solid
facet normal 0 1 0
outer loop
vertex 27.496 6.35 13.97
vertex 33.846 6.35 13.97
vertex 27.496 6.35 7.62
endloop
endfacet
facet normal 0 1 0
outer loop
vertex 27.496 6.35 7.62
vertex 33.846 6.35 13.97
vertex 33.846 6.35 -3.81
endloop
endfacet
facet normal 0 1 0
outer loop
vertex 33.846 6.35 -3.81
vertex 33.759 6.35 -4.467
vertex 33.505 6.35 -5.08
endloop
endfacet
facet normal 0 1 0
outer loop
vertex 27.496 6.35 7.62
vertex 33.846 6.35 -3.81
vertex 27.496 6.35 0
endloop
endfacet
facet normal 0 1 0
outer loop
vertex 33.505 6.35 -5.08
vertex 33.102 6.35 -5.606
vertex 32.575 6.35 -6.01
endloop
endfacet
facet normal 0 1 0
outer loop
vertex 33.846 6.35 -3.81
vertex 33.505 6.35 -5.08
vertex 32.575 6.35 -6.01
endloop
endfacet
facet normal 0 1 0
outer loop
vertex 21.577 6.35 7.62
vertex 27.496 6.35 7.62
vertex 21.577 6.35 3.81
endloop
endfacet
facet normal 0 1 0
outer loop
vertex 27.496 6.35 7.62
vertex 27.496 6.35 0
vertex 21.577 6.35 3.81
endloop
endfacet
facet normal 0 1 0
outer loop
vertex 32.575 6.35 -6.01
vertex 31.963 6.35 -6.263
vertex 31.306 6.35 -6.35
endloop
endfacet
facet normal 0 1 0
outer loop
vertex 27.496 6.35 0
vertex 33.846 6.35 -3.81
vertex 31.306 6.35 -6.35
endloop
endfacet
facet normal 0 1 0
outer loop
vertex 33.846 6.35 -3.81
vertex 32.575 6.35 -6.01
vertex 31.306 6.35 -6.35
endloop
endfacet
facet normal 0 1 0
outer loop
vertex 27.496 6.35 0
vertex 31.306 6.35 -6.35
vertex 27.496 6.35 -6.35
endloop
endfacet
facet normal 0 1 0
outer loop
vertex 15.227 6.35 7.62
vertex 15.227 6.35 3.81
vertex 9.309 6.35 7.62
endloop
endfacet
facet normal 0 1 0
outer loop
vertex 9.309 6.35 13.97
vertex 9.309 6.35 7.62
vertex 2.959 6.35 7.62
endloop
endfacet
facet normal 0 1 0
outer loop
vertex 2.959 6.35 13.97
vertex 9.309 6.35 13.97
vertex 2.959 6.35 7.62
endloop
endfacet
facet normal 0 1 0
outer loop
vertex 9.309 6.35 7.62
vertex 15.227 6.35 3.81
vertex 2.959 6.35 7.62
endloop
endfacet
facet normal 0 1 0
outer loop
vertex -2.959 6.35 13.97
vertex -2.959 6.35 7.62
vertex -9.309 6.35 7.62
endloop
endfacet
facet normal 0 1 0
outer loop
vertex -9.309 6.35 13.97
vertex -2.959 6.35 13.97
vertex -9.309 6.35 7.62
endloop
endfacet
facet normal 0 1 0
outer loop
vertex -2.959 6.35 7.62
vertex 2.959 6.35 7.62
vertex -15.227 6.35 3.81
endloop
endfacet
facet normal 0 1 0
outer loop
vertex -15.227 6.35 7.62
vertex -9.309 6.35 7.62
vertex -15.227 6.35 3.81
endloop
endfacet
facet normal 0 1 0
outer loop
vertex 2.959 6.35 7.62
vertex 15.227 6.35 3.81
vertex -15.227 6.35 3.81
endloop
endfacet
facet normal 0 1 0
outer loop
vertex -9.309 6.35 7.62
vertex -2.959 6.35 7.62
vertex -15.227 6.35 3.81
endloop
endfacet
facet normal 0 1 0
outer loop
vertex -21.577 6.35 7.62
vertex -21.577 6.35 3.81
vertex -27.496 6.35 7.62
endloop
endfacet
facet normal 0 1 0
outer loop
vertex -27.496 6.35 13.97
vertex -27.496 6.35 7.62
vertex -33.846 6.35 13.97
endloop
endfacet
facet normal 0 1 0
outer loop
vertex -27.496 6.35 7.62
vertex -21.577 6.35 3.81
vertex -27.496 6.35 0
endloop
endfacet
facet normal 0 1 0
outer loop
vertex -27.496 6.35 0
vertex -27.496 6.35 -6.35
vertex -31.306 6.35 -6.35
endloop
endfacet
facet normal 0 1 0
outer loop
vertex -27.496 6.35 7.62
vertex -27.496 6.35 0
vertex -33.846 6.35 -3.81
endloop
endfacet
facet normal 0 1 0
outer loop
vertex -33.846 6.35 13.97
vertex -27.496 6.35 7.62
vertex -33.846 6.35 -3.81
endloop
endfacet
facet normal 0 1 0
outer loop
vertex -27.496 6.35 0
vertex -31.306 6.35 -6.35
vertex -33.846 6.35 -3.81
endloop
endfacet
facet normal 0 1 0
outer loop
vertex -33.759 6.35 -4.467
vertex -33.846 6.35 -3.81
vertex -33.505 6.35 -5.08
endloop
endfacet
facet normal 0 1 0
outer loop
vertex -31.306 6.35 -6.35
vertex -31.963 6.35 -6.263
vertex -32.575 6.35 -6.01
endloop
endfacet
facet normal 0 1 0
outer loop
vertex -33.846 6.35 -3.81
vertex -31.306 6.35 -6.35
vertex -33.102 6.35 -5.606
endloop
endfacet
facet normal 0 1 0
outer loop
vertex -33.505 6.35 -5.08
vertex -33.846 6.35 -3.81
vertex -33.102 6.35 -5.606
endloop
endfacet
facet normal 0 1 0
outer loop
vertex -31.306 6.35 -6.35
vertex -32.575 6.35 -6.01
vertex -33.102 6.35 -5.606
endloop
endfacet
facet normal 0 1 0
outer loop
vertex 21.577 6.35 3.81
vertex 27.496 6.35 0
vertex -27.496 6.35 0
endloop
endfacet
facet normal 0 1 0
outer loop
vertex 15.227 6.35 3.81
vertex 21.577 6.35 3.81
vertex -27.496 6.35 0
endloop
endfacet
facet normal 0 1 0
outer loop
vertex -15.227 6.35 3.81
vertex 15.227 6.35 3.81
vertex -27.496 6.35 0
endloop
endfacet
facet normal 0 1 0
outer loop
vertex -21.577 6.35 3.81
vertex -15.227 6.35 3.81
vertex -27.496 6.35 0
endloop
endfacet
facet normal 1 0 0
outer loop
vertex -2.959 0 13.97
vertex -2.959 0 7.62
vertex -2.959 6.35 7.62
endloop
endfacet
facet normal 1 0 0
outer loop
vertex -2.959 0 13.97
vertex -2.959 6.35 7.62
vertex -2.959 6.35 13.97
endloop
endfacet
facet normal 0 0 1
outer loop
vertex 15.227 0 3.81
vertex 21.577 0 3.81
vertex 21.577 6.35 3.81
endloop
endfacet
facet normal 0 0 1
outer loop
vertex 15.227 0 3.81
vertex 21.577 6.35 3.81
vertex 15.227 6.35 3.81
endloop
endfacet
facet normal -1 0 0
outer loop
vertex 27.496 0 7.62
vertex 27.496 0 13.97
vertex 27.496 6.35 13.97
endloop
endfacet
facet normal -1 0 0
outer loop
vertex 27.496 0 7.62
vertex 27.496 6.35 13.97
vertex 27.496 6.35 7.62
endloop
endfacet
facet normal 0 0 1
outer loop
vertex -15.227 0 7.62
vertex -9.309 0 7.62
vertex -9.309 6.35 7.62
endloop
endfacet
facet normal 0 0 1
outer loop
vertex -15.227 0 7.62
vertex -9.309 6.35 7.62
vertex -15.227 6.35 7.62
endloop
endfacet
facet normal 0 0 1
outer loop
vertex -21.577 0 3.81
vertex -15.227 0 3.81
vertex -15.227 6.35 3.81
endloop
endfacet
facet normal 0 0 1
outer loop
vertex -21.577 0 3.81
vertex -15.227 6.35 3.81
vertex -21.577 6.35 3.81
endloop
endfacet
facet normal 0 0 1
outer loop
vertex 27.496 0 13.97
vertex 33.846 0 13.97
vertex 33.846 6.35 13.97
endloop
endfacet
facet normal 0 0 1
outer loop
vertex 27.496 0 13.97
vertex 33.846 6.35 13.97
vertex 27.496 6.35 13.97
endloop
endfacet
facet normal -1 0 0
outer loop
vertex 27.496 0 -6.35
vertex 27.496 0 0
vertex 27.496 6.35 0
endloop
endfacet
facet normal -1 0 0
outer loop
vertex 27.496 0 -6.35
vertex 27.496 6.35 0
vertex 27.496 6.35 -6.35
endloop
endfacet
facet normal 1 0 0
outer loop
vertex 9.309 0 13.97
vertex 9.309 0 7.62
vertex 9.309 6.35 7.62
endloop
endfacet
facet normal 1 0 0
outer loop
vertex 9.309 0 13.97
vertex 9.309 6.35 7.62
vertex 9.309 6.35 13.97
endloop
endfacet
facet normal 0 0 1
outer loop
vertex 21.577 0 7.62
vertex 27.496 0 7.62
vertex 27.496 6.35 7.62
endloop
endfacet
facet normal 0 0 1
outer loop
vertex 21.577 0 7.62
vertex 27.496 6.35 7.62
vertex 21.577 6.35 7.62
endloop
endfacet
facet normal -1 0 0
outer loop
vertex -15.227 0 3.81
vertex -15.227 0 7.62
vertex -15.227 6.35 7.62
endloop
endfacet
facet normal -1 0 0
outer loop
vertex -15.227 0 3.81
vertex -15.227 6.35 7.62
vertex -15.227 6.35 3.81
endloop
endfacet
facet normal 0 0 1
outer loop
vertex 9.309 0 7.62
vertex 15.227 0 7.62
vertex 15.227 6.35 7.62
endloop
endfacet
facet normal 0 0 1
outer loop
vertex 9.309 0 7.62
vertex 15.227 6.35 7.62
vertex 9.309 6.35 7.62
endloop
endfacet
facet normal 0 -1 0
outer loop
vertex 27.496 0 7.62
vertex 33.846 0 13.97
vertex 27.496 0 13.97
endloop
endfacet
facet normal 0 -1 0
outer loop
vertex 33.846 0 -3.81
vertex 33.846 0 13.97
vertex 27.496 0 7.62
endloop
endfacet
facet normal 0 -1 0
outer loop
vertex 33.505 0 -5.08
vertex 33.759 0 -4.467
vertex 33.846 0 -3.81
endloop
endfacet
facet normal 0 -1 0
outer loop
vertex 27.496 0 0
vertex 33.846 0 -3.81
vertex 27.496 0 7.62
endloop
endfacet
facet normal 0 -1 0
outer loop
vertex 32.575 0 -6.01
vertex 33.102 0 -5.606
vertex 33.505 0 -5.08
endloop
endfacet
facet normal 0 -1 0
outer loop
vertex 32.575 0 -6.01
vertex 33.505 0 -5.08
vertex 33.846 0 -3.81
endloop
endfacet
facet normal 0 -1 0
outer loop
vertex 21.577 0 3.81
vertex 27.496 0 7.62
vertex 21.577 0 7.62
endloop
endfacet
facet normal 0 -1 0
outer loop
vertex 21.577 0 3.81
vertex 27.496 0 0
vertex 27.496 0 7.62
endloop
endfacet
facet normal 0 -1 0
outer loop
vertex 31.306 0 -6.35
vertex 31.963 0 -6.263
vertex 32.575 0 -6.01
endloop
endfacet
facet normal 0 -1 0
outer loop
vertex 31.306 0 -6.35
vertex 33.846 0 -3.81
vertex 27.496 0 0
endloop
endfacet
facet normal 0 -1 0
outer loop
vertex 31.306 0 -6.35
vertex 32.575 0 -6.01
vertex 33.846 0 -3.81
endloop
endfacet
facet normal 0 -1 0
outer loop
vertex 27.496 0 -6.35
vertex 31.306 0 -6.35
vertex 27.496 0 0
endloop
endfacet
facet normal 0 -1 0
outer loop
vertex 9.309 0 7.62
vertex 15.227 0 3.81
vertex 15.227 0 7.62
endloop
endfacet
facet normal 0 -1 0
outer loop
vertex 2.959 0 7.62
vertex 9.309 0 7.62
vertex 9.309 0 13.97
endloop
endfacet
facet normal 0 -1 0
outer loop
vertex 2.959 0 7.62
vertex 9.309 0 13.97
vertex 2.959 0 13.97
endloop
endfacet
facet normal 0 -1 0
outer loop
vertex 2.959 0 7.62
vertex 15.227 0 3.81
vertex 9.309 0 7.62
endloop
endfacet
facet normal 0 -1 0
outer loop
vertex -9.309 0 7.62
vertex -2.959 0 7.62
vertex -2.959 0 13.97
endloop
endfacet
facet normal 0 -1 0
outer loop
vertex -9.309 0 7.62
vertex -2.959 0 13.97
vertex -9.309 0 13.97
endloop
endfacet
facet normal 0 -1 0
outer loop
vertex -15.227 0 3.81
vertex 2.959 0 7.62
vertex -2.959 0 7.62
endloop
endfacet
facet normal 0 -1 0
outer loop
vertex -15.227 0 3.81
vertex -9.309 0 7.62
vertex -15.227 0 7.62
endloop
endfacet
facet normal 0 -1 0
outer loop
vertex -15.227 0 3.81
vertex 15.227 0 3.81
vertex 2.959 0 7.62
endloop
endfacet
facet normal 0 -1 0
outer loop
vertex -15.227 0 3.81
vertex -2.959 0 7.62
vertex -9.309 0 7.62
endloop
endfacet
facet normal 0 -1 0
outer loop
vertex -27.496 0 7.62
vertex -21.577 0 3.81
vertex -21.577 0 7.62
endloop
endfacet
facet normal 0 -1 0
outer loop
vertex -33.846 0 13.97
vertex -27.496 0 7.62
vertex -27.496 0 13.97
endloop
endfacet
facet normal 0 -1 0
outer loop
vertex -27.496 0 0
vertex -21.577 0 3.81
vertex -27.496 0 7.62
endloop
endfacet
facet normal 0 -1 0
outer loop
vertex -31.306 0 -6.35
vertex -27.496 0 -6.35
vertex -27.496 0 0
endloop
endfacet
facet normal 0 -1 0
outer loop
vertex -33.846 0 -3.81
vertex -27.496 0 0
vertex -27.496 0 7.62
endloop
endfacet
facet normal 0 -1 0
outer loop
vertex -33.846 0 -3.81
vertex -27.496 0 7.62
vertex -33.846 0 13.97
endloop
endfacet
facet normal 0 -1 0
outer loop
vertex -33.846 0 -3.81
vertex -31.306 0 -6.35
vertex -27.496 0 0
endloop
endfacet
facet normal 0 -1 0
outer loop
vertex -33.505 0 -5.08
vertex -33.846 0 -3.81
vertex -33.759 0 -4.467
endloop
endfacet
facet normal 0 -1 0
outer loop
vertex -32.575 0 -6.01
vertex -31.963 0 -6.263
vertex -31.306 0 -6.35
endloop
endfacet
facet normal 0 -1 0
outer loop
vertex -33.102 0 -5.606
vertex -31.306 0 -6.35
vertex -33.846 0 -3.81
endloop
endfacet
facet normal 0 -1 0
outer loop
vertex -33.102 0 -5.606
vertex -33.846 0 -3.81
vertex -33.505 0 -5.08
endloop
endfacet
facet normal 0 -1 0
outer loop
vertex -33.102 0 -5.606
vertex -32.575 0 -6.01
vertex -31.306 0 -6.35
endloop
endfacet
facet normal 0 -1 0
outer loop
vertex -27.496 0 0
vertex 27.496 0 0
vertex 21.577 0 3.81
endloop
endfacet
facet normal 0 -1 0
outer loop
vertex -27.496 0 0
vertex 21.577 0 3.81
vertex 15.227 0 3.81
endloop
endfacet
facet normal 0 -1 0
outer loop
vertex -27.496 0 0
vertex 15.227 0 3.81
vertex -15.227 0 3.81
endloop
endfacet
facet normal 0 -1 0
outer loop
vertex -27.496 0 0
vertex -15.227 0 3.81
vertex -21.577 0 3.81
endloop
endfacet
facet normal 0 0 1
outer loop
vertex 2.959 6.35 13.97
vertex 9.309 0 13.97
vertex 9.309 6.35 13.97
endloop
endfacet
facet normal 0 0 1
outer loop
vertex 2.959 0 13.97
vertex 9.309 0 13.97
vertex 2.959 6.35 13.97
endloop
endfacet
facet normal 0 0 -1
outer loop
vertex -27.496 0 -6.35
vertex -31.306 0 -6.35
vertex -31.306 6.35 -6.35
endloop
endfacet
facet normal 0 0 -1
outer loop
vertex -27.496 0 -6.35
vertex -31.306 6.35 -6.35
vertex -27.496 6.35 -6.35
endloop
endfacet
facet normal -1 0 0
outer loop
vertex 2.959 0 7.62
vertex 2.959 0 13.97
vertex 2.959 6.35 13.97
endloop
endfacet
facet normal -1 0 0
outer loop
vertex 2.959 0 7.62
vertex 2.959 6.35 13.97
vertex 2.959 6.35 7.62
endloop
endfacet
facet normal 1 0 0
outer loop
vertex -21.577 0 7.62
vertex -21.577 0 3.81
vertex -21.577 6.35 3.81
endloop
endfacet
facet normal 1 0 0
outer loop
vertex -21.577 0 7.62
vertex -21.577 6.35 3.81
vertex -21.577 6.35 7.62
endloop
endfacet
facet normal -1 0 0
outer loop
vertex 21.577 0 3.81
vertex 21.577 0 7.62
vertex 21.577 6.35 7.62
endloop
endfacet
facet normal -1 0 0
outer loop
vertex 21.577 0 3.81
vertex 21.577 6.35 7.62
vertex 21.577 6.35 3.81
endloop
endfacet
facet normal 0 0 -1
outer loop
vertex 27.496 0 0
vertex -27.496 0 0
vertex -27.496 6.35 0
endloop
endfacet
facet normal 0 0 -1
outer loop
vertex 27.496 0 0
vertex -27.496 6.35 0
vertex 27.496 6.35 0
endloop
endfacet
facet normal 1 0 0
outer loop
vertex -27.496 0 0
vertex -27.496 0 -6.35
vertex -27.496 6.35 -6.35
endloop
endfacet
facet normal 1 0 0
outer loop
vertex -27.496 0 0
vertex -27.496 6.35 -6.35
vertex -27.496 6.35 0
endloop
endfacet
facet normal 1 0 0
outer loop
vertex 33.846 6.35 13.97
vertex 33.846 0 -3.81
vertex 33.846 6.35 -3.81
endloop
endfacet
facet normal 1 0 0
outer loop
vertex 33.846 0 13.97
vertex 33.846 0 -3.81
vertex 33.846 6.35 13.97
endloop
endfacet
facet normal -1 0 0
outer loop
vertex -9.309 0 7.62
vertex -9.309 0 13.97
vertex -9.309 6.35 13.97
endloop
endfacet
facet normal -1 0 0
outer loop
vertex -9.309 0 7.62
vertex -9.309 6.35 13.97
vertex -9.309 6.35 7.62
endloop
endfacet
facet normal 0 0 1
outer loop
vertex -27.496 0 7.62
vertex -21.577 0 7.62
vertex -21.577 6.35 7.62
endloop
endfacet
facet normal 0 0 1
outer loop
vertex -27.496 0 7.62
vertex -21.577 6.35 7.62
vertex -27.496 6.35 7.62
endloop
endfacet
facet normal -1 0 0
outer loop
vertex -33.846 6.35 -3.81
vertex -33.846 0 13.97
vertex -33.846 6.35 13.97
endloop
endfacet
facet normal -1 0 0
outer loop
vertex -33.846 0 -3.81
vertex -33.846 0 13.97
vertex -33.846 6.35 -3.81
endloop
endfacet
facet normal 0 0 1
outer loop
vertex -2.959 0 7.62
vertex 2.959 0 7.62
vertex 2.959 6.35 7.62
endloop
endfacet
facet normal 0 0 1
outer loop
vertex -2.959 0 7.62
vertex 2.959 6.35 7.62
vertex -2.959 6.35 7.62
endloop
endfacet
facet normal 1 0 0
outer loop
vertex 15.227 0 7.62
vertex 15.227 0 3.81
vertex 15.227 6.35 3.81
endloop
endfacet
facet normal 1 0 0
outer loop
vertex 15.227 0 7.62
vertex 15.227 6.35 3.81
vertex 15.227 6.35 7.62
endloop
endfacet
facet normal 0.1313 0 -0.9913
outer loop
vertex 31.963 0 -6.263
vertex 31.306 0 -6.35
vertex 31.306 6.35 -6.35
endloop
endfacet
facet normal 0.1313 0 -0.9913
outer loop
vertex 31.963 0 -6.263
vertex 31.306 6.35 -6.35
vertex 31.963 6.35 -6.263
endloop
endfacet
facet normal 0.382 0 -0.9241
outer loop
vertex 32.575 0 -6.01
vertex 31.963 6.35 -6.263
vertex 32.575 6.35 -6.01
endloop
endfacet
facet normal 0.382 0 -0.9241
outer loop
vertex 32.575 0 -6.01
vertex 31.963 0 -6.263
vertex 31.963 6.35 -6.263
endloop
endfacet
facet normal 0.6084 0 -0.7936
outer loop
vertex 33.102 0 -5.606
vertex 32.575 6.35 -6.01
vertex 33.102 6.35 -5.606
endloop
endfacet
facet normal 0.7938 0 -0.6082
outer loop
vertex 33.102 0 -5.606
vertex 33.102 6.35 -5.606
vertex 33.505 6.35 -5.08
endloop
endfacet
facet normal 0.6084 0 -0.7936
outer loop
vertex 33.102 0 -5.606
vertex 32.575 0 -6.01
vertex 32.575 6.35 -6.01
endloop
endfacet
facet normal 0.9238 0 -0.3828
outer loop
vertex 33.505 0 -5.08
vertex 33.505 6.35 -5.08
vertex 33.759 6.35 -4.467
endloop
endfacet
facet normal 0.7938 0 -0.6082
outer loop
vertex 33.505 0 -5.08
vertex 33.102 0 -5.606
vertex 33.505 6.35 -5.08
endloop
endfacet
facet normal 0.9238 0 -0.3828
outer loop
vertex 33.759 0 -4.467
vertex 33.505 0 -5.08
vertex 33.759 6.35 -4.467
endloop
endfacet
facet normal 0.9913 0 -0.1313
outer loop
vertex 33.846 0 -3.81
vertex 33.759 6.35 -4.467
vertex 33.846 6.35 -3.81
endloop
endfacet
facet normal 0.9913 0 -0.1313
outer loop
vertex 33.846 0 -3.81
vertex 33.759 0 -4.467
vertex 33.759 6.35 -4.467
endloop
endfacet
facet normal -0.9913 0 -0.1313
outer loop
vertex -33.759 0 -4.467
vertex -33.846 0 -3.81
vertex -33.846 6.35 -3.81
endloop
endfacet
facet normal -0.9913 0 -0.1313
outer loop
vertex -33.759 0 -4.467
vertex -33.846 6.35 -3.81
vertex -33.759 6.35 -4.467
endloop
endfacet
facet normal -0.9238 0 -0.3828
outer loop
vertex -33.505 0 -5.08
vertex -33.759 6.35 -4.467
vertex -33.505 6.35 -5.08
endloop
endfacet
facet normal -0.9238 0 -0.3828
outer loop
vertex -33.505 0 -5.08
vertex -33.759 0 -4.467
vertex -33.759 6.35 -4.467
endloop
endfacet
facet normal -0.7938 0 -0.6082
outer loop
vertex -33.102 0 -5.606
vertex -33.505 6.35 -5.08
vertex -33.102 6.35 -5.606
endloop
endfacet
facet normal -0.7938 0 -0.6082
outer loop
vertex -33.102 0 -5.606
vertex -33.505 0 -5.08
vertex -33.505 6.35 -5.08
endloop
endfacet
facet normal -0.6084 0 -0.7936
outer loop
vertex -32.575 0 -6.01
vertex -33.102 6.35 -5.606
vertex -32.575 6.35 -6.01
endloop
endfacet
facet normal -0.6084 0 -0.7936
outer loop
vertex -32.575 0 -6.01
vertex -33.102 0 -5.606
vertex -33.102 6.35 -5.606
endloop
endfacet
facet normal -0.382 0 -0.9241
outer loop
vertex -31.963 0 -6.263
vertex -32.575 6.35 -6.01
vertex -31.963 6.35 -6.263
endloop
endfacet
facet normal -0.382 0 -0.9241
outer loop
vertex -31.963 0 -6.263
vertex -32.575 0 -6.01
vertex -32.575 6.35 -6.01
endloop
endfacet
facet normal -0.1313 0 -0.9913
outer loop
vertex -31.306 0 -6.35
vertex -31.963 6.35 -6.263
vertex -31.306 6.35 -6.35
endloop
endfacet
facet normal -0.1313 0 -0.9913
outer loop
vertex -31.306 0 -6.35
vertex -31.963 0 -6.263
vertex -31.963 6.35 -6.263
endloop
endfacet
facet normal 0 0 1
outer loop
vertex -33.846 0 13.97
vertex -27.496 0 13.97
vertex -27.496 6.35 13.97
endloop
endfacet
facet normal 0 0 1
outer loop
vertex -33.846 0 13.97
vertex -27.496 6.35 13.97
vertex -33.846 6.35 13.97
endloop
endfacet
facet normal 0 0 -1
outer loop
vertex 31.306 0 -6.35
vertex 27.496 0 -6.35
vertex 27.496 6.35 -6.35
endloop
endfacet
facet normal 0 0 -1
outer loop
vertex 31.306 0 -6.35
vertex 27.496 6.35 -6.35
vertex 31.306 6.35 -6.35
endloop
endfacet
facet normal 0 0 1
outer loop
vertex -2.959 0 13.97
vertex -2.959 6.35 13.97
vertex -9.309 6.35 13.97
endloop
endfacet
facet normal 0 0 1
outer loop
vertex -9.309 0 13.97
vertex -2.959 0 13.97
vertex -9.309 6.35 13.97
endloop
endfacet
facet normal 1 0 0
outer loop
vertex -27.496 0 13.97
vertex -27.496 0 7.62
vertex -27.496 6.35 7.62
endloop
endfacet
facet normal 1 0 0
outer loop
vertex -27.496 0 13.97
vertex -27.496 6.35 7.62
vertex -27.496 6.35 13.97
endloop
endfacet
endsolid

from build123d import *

# Parameters (mm, degrees)
BOSS_EXTRUDE1_DEPTH = 6.35


with BuildPart() as part:
    # Sketch1 → Boss-Extrude1 (new body)
    with BuildSketch(Plane(origin=(0, 0, 0), x_dir=(1, 0, 0), z_dir=(0, 1, 0))):
        with BuildLine():
            Line((-24.3205, 0), (24.3205, 0))
            Line((24.3205, 0), (27.4955, 0))
            Line((27.4955, 0), (27.4955, 6.35))
            Line((27.4955, 6.35), (31.3055, 6.35))
            ThreePointArc((31.3055, 6.35), (33.101551224, 5.606051224), (33.8455, 3.81))
            Line((33.8455, 3.81), (33.8455, -13.97))
            Line((33.8455, -13.97), (27.4955, -13.97))
            Line((27.4955, -13.97), (27.4955, -7.62))
            Line((27.4955, -7.62), (21.5773, -7.62))
            Line((21.5773, -7.62), (21.5773, -3.81))
            Line((21.5773, -3.81), (15.2273, -3.81))
            Line((15.2273, -3.81), (15.2273, -7.62))
            Line((15.2273, -7.62), (9.3091, -7.62))
            Line((9.3091, -7.62), (9.3091, -13.97))
            Line((9.3091, -13.97), (2.9591, -13.97))
            Line((2.9591, -13.97), (2.9591, -7.62))
            Line((2.9591, -7.62), (-2.9591, -7.62))
            Line((-2.9591, -7.62), (-2.9591, -13.97))
            Line((-2.9591, -13.97), (-9.3091, -13.97))
            Line((-9.3091, -13.97), (-9.3091, -7.62))
            Line((-9.3091, -7.62), (-15.2273, -7.62))
            Line((-15.2273, -7.62), (-15.2273, -3.81))
            Line((-15.2273, -3.81), (-21.5773, -3.81))
            Line((-21.5773, -3.81), (-21.5773, -7.62))
            Line((-21.5773, -7.62), (-27.4955, -7.62))
            Line((-27.4955, -7.62), (-27.4955, -13.97))
            Line((-27.4955, -13.97), (-33.8455, -13.97))
            Line((-33.8455, -13.97), (-33.8455, -7.62))
            Line((-33.8455, -7.62), (-33.8455, 3.81))
            ThreePointArc((-33.8455, 3.81), (-33.101551224, 5.606051224), (-31.3055, 6.35))
            Line((-31.3055, 6.35), (-27.4955, 6.35))
            Line((-27.4955, 6.35), (-27.4955, 0))
            Line((-27.4955, 0), (-24.3205, 0))
        make_face()
    extrude(amount=BOSS_EXTRUDE1_DEPTH)


solid = part.part
